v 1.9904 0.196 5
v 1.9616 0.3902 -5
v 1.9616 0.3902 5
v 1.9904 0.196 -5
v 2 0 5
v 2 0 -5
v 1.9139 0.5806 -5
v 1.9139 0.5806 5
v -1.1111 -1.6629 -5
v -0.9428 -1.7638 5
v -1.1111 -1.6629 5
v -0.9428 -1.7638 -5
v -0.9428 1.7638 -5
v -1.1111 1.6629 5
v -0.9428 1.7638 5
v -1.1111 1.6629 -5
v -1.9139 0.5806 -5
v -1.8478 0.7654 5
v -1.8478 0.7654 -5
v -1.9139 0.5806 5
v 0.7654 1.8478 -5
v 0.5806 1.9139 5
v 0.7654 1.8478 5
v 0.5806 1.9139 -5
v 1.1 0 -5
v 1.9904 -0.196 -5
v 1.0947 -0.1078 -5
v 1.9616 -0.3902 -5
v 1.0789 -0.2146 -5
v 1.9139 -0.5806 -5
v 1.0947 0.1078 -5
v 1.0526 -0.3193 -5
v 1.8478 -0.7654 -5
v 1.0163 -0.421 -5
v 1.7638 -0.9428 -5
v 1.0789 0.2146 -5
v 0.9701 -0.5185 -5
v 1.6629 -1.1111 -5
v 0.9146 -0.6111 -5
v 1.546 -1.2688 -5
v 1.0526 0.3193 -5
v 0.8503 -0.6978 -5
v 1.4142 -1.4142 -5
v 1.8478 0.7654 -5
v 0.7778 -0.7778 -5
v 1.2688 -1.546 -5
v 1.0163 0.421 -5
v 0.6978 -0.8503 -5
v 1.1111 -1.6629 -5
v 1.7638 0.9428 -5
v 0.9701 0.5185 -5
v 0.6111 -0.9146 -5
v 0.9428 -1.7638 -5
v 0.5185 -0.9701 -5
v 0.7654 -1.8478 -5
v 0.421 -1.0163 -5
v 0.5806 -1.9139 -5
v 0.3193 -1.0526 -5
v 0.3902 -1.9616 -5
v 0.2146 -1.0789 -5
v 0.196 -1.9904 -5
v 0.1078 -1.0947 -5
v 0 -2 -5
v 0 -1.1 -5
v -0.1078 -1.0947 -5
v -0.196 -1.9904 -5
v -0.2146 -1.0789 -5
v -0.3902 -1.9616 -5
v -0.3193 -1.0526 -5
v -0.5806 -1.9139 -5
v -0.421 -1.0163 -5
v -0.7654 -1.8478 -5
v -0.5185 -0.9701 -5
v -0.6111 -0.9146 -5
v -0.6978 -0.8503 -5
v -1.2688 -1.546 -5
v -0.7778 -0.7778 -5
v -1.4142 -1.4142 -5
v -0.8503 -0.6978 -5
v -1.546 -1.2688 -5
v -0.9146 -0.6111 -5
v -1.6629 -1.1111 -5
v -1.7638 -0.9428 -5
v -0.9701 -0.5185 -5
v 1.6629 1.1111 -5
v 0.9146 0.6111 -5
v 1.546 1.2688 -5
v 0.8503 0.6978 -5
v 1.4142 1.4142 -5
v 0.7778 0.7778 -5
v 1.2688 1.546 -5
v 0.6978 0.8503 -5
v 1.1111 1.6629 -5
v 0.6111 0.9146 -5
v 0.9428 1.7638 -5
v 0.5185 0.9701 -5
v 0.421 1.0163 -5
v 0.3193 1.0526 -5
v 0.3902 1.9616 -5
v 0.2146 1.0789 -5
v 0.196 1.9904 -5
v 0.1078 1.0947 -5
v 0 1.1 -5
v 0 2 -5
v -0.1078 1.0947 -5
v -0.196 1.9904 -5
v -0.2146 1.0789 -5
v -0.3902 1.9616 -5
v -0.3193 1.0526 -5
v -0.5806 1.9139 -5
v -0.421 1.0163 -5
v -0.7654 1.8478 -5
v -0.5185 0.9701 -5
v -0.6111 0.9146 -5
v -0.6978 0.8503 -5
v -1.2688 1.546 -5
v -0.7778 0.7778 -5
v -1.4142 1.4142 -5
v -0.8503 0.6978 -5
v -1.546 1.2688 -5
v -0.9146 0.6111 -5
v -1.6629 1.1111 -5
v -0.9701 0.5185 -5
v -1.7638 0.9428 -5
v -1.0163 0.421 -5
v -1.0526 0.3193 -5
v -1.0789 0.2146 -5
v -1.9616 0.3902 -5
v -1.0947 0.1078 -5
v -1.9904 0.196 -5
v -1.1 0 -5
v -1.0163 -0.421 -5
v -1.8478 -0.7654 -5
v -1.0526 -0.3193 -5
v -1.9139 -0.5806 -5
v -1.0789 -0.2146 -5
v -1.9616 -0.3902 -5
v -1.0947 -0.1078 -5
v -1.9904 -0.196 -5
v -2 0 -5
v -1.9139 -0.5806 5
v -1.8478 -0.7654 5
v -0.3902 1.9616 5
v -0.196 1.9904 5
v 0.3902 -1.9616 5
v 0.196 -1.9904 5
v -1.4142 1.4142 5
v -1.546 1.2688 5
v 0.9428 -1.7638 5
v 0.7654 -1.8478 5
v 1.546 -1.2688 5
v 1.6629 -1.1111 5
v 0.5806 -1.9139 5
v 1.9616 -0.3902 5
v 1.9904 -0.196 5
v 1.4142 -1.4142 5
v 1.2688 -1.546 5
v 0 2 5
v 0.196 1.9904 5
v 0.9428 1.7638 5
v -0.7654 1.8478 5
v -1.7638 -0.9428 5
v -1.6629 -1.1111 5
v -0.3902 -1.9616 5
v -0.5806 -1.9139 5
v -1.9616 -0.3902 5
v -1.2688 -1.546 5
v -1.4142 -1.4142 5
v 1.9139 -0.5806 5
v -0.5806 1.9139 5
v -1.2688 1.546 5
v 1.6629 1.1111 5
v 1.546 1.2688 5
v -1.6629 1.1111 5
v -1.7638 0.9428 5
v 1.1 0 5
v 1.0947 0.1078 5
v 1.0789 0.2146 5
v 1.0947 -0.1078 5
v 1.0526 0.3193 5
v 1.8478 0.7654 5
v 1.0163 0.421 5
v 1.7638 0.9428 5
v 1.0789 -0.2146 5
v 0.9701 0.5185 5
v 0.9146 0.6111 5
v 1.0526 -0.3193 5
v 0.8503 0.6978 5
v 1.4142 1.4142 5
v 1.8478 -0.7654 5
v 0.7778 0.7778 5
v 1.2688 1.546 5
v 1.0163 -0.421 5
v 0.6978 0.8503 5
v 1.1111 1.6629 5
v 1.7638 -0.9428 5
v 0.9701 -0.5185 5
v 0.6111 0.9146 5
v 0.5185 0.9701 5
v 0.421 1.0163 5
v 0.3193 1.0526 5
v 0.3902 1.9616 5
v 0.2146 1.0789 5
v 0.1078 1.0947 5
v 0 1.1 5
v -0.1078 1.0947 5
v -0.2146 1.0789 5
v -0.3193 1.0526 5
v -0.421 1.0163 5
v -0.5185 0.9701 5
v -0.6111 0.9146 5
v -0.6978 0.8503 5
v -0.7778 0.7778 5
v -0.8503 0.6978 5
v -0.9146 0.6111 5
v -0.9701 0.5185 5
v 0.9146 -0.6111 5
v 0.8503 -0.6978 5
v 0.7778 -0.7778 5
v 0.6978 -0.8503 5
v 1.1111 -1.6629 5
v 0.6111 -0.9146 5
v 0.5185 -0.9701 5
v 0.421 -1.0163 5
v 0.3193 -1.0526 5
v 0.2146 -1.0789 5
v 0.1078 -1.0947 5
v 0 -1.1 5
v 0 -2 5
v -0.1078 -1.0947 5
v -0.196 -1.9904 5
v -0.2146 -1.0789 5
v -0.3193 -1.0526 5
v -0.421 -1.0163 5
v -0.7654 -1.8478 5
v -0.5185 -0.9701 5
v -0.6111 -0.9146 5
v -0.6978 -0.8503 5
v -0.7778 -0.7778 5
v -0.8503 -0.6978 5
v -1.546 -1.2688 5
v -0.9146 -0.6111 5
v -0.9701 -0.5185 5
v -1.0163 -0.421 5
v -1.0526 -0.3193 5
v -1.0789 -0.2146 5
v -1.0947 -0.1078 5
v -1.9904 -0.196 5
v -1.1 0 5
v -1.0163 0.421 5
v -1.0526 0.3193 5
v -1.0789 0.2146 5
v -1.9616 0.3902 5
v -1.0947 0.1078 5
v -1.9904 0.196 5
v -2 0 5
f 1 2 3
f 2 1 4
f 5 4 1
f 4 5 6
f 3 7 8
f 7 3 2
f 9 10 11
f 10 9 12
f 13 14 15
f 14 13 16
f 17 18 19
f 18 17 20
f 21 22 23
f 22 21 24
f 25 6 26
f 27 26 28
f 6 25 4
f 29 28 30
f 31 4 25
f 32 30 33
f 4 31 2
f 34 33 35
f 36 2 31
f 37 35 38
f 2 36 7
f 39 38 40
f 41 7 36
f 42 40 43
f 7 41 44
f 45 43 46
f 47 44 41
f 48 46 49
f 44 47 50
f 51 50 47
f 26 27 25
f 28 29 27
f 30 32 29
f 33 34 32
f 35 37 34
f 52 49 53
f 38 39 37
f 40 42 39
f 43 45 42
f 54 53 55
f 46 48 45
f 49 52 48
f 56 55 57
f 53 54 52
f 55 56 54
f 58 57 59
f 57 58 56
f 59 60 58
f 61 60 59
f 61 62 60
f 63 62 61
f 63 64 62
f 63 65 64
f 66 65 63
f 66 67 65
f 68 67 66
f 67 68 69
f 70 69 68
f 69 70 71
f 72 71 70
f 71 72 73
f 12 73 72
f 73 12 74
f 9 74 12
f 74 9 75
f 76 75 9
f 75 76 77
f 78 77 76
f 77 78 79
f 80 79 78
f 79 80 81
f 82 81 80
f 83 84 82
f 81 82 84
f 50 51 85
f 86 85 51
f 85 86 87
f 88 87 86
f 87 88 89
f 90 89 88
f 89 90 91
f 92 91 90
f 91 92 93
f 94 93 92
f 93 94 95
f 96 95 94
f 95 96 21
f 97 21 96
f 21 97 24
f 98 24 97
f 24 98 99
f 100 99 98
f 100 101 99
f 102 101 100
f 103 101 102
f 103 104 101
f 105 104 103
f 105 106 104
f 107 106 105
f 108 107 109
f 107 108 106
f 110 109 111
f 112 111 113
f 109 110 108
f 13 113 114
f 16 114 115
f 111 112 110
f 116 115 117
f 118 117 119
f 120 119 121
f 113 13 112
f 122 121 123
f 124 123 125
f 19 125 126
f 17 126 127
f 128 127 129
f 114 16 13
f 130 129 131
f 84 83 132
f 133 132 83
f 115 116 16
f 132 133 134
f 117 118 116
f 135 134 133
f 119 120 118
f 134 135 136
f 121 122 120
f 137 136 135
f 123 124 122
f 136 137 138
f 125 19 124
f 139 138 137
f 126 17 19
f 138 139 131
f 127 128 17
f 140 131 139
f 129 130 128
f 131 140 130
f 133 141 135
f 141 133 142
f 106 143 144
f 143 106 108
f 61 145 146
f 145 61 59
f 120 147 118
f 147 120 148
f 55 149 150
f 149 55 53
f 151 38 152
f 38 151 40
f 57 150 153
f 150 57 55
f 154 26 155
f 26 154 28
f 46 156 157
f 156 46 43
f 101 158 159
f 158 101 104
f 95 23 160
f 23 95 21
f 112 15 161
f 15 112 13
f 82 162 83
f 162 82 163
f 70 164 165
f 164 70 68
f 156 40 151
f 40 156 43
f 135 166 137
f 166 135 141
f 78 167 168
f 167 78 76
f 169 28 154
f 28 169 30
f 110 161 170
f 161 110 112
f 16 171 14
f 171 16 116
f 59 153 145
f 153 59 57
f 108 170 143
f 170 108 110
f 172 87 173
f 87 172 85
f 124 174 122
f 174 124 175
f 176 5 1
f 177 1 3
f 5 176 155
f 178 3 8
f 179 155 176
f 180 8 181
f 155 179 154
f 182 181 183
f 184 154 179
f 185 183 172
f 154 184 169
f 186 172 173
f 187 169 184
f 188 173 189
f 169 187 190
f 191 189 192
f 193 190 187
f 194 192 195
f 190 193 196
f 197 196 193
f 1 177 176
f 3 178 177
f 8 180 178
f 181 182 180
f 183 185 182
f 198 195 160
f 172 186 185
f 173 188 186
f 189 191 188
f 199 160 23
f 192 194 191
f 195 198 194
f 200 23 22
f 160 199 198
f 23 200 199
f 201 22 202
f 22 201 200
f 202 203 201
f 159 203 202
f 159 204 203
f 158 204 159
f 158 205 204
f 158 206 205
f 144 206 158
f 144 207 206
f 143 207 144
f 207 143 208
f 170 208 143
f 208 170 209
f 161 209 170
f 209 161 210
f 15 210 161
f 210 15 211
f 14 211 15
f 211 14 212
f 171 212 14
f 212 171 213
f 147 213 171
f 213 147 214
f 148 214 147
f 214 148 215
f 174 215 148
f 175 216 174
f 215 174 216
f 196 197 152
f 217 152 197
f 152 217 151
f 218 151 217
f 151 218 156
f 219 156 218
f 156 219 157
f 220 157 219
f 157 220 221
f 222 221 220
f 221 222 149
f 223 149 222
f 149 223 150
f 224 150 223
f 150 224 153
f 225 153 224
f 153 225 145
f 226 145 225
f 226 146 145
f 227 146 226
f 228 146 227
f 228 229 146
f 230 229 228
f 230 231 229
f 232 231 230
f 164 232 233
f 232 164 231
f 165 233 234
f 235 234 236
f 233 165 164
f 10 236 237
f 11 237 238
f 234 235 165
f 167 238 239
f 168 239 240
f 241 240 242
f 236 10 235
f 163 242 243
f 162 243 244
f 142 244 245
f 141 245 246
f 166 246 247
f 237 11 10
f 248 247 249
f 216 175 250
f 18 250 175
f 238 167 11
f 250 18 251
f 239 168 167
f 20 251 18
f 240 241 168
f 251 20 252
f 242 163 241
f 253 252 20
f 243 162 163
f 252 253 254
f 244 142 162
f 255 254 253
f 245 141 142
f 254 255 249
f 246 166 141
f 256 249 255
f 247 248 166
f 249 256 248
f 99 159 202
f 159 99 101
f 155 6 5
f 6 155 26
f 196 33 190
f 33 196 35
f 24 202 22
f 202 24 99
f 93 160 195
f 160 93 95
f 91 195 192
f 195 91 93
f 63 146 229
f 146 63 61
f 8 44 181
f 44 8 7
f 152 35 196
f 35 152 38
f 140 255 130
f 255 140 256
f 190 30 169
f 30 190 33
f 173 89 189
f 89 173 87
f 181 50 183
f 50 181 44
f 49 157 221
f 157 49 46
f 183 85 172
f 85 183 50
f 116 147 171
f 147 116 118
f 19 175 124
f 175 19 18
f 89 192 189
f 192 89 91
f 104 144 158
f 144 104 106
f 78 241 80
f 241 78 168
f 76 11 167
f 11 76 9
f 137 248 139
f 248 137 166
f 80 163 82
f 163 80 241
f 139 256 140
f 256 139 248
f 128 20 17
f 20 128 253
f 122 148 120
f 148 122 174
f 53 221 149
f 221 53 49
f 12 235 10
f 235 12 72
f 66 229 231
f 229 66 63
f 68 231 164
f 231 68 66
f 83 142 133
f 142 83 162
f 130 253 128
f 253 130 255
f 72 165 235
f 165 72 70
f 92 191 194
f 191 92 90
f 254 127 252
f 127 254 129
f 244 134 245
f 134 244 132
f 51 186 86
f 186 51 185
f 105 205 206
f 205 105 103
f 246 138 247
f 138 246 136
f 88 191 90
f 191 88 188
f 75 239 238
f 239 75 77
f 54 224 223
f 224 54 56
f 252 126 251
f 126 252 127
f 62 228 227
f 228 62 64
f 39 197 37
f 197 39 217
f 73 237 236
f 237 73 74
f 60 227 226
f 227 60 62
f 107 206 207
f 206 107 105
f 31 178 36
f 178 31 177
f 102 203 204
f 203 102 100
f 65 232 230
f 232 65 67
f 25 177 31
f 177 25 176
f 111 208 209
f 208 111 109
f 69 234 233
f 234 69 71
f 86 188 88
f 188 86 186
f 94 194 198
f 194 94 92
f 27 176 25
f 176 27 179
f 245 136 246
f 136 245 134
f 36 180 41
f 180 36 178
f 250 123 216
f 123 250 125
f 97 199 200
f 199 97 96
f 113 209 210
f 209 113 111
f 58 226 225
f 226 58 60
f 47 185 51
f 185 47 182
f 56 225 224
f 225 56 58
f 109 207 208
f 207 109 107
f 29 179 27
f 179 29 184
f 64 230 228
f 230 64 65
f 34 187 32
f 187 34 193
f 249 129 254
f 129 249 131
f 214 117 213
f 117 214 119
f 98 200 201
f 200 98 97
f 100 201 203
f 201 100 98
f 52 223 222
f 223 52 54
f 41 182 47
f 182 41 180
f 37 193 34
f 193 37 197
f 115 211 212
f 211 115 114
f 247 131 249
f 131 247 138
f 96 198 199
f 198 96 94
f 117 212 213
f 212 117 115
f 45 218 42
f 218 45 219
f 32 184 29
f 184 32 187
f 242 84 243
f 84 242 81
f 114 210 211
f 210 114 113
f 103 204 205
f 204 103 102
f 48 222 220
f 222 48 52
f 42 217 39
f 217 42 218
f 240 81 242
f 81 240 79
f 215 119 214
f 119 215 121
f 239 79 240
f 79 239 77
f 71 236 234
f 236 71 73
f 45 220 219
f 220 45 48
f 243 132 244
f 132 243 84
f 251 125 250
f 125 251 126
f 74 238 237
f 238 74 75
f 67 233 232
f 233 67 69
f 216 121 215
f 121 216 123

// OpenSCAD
module M2(length=10)
{
  
  difference()
  {
    cylinder(d=4,h=length,center=true, $fn=64);
    cylinder(d=2.2,h=length,center=true, $fn=64);    
  }
  
}

M2(10);
